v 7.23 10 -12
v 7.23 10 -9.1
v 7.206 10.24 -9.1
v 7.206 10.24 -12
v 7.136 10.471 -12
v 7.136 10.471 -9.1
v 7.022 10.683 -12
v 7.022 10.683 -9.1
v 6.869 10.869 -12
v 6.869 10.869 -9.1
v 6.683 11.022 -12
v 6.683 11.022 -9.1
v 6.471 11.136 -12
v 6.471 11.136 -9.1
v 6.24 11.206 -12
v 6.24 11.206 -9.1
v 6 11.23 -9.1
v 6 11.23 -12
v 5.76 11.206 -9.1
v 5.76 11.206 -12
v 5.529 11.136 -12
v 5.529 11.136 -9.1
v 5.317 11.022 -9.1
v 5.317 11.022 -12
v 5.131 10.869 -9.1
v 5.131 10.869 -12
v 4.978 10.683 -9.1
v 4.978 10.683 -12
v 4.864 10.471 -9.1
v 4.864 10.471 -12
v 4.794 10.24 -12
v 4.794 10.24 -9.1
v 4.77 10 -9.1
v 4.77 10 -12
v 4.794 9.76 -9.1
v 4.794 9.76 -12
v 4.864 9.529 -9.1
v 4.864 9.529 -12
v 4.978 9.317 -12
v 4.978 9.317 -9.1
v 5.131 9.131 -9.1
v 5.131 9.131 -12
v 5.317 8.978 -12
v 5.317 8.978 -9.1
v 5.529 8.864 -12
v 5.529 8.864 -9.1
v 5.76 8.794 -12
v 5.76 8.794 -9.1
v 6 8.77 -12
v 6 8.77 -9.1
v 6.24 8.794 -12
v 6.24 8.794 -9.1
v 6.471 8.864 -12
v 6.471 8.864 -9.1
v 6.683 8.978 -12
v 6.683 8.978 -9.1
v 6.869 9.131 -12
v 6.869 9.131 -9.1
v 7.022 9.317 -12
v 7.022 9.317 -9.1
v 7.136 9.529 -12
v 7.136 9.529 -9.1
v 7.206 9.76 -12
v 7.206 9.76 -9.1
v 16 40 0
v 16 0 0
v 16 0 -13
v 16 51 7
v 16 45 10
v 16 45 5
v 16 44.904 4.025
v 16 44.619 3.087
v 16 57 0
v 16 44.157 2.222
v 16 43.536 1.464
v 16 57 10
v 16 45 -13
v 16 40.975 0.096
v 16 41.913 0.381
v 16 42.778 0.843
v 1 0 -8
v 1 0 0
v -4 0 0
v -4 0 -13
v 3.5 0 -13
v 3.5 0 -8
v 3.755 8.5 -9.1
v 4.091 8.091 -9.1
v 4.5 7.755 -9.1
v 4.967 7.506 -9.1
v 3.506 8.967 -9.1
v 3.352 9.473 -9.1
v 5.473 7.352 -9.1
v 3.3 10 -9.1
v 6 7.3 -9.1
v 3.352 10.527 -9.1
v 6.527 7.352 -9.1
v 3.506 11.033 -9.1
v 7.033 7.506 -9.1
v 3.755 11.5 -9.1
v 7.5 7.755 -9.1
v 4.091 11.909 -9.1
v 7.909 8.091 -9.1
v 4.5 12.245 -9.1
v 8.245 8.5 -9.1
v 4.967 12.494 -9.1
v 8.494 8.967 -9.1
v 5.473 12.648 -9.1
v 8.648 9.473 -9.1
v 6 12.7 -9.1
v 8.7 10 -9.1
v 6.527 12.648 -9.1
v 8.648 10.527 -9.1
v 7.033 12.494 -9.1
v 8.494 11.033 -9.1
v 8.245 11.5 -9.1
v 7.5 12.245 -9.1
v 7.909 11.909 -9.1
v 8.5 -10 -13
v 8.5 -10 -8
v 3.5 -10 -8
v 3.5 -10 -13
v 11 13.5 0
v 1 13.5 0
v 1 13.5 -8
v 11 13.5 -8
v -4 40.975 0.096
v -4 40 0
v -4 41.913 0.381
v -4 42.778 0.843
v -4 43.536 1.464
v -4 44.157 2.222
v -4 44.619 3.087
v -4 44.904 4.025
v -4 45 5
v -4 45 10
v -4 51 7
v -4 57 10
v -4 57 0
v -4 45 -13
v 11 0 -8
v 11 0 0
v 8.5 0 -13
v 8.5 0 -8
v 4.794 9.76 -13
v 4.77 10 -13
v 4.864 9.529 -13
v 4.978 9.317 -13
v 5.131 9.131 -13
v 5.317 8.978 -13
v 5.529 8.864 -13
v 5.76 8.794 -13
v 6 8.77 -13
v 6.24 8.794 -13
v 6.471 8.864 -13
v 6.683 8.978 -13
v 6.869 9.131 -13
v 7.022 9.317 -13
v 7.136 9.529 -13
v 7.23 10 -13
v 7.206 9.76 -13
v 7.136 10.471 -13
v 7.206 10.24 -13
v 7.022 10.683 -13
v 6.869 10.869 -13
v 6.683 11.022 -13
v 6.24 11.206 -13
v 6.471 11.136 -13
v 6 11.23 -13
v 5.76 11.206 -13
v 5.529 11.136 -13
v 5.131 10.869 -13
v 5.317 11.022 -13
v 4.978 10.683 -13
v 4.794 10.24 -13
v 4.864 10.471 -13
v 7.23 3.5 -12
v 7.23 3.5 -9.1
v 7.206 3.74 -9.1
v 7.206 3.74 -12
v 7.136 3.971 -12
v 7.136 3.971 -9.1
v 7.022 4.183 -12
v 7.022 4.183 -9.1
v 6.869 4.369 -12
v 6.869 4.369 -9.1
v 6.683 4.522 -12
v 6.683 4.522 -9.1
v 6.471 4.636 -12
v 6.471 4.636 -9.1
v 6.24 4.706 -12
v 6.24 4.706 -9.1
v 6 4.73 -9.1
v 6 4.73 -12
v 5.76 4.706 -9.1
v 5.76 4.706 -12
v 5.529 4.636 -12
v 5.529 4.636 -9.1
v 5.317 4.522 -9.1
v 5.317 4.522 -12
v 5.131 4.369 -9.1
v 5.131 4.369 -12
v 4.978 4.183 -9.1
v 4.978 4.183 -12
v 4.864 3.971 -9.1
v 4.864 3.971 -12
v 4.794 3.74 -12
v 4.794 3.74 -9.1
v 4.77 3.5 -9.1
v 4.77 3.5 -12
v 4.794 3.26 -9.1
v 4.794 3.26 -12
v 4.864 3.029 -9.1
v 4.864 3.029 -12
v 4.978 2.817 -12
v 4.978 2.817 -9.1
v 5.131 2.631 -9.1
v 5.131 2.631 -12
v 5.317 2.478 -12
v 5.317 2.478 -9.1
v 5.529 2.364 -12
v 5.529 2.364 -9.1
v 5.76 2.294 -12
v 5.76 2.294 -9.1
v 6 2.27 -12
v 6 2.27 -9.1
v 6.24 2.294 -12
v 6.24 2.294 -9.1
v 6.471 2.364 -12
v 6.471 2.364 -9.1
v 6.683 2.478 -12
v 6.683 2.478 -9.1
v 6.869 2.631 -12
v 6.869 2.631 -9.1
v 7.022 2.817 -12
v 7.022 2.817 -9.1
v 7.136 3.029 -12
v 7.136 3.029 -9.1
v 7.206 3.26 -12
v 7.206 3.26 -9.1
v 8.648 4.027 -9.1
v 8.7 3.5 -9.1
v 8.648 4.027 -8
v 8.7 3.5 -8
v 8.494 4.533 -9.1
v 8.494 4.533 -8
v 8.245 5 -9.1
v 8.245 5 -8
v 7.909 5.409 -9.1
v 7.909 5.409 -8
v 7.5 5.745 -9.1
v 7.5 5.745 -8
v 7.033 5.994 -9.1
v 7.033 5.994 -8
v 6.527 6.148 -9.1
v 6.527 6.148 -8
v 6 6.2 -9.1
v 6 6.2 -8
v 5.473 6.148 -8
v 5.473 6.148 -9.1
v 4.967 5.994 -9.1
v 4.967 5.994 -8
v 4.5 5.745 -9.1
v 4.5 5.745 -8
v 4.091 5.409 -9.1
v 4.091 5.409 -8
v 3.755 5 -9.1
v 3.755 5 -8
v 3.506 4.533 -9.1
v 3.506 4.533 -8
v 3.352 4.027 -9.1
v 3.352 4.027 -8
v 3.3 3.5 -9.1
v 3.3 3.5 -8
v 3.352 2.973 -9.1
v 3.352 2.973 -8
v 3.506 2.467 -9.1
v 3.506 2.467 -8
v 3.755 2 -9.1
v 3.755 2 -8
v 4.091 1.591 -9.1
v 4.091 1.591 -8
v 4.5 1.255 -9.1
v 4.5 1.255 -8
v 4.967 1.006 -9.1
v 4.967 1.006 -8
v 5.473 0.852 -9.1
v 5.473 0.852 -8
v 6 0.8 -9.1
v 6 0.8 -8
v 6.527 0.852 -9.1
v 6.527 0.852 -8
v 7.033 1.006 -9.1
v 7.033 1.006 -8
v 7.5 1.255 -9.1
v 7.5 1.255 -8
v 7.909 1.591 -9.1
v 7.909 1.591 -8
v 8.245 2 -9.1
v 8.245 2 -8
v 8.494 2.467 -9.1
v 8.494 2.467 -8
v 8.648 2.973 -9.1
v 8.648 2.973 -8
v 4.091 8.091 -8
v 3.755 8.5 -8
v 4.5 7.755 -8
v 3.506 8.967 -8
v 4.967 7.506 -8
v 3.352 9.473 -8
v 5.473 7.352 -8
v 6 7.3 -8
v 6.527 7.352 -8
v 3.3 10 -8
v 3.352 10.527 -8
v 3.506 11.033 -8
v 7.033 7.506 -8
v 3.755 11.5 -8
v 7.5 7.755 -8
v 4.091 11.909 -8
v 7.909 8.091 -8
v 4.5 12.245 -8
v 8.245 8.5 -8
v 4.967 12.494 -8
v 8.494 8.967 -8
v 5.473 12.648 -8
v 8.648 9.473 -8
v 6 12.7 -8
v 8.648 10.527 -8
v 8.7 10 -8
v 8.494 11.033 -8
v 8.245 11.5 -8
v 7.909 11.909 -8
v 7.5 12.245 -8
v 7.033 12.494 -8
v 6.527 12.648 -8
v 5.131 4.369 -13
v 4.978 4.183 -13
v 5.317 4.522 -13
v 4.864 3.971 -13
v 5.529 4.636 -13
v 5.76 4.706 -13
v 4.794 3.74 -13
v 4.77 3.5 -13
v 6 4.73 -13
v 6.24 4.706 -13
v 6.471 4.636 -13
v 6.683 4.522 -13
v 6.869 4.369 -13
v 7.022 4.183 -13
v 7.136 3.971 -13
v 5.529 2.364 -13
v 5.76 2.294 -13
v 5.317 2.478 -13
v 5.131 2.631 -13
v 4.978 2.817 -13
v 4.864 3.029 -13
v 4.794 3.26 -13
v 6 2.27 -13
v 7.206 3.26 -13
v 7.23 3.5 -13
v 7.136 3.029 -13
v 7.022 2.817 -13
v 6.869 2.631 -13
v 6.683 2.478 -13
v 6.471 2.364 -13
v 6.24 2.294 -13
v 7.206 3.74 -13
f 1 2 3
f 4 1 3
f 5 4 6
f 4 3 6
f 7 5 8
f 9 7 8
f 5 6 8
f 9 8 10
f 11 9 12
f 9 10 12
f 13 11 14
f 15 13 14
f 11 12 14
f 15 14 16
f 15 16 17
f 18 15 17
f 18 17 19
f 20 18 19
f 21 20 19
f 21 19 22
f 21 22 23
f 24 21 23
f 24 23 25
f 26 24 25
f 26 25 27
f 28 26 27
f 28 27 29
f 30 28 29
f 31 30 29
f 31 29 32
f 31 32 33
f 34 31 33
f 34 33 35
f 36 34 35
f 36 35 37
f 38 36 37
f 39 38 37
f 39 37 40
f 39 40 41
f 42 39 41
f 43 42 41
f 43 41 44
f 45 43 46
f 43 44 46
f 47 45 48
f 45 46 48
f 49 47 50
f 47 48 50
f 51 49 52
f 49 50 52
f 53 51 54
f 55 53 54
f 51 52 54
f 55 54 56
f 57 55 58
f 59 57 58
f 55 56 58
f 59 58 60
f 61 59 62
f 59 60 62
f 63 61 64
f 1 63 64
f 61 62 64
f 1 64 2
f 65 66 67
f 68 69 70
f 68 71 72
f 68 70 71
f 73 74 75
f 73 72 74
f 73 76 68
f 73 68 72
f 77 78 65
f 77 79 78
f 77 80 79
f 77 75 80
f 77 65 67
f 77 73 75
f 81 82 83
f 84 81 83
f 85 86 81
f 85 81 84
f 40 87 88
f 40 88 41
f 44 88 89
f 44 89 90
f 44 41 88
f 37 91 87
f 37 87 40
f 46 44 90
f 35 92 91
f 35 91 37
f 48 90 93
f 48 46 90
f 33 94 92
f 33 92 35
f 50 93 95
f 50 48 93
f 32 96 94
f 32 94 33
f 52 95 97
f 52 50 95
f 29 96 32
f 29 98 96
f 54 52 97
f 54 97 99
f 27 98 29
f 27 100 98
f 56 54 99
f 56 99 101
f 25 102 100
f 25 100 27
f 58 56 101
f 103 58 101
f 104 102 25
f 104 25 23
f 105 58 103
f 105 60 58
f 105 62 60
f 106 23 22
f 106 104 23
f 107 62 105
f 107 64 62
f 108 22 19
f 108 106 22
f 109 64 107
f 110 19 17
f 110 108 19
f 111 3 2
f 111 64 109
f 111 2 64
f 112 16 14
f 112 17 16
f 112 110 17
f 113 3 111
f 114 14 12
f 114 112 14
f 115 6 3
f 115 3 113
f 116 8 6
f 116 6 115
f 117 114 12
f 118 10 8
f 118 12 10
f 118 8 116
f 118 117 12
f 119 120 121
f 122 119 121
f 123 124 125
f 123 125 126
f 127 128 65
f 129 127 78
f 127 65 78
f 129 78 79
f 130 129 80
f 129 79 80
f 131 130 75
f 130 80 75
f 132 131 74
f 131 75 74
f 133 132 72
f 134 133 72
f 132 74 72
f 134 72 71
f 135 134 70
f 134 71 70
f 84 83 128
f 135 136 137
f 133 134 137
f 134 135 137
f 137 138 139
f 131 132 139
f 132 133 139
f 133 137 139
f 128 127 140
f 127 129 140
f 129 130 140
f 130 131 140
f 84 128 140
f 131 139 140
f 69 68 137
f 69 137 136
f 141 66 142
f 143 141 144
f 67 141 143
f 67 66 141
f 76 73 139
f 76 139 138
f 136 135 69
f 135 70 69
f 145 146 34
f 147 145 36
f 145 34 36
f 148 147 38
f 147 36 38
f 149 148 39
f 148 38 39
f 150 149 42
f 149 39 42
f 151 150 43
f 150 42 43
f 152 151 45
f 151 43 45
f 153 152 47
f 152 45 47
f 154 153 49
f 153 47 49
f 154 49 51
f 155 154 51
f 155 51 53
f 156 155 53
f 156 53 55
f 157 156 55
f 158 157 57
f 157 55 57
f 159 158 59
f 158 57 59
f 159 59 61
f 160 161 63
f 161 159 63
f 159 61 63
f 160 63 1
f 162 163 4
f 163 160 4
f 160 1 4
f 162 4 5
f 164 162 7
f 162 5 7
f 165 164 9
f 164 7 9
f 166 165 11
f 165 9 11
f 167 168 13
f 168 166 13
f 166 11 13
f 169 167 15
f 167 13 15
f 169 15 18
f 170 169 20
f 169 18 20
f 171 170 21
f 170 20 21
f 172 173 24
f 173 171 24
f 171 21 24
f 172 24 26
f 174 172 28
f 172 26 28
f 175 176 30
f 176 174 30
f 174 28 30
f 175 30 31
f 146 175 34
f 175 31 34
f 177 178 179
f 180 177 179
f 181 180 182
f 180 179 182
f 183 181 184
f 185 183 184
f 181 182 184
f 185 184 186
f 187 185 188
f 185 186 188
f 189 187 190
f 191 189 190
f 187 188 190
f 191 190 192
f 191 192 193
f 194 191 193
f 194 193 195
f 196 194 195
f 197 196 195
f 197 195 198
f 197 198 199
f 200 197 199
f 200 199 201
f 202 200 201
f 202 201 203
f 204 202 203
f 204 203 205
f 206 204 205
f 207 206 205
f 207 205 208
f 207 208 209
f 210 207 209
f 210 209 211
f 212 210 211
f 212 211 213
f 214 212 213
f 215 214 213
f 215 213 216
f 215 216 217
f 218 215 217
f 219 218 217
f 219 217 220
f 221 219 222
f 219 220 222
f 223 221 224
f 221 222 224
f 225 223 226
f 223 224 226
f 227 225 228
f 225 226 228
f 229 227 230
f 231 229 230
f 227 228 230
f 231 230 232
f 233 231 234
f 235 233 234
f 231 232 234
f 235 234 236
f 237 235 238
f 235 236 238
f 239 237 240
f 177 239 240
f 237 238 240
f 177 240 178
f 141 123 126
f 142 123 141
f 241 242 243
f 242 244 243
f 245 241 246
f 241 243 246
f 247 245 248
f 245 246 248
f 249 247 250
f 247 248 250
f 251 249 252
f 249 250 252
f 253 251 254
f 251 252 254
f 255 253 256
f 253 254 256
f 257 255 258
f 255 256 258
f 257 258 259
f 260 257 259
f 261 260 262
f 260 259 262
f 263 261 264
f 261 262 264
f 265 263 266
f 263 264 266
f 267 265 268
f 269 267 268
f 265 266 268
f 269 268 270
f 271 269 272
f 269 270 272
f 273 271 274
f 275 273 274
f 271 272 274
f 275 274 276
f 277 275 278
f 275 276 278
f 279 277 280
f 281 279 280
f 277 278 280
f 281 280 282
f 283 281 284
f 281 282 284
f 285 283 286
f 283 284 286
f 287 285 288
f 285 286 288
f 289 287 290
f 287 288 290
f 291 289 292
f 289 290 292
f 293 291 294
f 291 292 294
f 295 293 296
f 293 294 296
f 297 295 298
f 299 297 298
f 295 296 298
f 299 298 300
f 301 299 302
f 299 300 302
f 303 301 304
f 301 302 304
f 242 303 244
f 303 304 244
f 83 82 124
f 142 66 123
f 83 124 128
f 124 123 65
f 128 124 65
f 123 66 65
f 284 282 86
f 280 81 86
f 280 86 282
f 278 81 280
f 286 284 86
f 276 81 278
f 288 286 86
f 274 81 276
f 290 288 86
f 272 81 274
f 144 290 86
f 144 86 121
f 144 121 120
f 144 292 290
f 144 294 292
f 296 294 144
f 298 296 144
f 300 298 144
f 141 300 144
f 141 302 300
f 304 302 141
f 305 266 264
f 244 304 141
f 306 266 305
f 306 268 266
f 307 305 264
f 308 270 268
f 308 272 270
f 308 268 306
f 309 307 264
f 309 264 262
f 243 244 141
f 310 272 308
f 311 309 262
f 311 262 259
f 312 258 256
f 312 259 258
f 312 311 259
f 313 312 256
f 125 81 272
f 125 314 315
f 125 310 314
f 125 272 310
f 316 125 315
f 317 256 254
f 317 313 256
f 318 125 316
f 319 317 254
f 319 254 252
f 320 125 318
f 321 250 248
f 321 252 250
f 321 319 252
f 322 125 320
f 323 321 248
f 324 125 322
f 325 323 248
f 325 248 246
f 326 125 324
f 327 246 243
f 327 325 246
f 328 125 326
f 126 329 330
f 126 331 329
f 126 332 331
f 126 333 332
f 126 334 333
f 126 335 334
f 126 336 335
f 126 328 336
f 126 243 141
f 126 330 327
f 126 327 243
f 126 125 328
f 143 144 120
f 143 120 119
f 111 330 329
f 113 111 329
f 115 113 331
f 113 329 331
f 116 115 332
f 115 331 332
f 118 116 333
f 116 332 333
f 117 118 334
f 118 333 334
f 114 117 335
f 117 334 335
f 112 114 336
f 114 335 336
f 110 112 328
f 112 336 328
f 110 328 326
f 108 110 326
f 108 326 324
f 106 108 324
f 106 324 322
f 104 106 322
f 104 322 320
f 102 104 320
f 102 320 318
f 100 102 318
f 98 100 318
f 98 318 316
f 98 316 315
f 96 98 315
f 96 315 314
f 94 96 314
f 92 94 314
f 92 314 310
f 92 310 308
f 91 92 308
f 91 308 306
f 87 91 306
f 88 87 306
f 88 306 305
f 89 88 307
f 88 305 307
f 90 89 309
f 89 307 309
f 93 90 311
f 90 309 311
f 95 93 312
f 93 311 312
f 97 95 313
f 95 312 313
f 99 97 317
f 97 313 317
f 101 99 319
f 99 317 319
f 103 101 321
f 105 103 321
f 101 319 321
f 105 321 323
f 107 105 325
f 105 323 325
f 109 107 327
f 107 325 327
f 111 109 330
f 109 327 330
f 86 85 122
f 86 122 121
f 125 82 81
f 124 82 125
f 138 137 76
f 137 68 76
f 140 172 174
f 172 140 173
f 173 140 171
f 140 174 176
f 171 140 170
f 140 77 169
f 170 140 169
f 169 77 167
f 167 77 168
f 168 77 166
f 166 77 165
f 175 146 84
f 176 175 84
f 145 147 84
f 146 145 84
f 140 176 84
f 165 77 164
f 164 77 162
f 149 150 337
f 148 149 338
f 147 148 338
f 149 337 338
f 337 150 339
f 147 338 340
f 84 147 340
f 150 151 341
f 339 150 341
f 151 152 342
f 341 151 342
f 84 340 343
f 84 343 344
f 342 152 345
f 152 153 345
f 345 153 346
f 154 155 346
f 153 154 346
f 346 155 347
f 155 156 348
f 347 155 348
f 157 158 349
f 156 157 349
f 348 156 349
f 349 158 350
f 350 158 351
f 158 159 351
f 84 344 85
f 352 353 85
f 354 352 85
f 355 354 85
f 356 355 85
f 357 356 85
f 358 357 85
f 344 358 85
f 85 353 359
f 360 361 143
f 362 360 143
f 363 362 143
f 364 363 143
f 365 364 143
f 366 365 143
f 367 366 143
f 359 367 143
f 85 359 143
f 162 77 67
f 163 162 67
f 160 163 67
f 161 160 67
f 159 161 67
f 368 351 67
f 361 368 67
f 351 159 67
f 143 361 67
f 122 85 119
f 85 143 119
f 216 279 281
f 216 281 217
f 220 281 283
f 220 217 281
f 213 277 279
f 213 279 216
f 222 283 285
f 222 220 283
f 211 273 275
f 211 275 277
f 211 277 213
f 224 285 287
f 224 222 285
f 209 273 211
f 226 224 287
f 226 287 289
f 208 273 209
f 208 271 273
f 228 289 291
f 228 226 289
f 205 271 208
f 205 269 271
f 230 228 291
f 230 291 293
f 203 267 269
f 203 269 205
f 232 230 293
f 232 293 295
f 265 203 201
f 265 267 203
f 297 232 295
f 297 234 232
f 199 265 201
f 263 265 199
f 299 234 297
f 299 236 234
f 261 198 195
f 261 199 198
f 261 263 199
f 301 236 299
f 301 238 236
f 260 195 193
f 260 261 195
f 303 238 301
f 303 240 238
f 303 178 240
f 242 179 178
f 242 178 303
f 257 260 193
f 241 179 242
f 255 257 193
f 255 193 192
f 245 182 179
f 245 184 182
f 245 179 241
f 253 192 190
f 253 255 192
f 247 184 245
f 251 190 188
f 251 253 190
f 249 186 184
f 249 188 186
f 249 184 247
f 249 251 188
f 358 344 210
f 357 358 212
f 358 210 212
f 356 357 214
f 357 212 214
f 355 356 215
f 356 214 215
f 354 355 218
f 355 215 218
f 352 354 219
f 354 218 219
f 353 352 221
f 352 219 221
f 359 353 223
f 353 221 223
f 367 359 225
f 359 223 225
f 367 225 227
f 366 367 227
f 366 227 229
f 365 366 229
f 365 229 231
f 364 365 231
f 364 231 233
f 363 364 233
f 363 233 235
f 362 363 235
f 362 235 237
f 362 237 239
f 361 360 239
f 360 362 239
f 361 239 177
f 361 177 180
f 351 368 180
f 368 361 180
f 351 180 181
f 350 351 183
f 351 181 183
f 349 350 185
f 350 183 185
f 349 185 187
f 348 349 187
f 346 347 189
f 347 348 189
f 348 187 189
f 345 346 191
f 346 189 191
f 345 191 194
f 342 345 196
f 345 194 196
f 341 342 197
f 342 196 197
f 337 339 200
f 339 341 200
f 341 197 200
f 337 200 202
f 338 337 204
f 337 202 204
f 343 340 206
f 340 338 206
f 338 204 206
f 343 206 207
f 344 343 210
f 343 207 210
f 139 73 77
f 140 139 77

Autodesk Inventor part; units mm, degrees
ref_plane "YZ Plane" through (0, 0, 0) normal (1, 0, 0) x (0, 1, 0)
ref_plane "XZ Plane" through (0, 0, 0) normal (0, 1, 0) x (-1, 0, 0)
sketch "Sketch2" plane through (0, 0, 0) normal (1, 0, 0) x (0, 1, 0)
  line L0 (0, 0) -> (15, 0)
  line L1 (15, 0) -> (15, -10)
  line L2 (15, -10) -> (0, -10)
  line L3 (0, -10) -> (0, 0)
  dimension "d4" = 15
  dimension "d5" = 10
extrude "Extrusion2" add sketch "Sketch2" along normal blind 12
sketch "Sketch3" plane through (0, 0, 0) normal (0, 0, 1) x (1, 0, 0)
  line L0 (0, 0) -> (1, 0)
  line L1 (0, 0) -> (12, 0) projected
  line L2 (1, 0) -> (1, 13.5)
  line L3 (1, 13.5) -> (11, 13.5)
  line L4 (11, 13.5) -> (11, 0)
  line L5 (11, 0) -> (1, 0)
  dimension "d8" = 1
  dimension "d9" = 13.5
  dimension "d10" = 10
extrude "Extrusion3" cut sketch "Sketch3" against normal blind 8
sketch "Sketch4" plane through (0, 0, -10) normal (0, 0, -1) x (-1, 0, 0)
  line L0 (0, 15) -> (-12, 15) projected
  line L1 (0, 0) -> (-12, 0) projected
  line L2 (-12, 15) -> (0, 15)
  line L3 (0, 15) -> (0, 0)
  line L4 (0, 0) -> (-12, 0)
  line L5 (-12, 0) -> (-12, 15)
extrude "Extrusion4" add sketch "Sketch4" along normal blind 2
sketch "Sketch5" plane through (0, 0, -8) normal (0, 0, 1) x (1, 0, 0)
  line L0 (1, 13.5) -> (11, 13.5) projected
  line L1 (6, 13.5) -> (6, 10)
  line L2 (6, 10) -> (6, 3.5)
  circle A0 centre (6, 10) radius 1.2295
  circle A1 centre (6, 3.5) radius 1.2295
  point P0 (0, 0)
  dimension "d15" = 3.5
  dimension "d16" = 6.5
  dimension "d17" = 2.459
  dimension "d18" = 2.459
extrude "Extrusion5" cut sketch "Sketch5" against normal blind 4
sketch "Sketch6" plane through (0, 0, -8) normal (0, 0, 1) x (1, 0, 0)
  circle A0 centre (6, 10) radius 1.2295 projected
  circle A1 centre (6, 10) radius 2.7
  circle A2 centre (6, 3.5) radius 1.2295 projected
  circle A3 centre (6, 3.5) radius 2.7
  point P0 (0, 0)
  dimension "d21" = 5.4
  dimension "d22" = 5.4
extrude "Extrusion6" cut sketch "Sketch6" against normal blind 1.1
sketch "Sketch15" plane through (12, 0, 0) normal (1, 0, 0) x (0, 0, -1)
  line L0 (0, 15) -> (12, 15) projected
  line L1 (12, 15) -> (12, 0) projected
  line L2 (0, 15) -> (12, 15)
  line L3 (12, 15) -> (12, 0)
  line L4 (12, 0) -> (0, 0)
  line L5 (0, 0) -> (0, 15)
extrude "Extrusion14" add sketch "Sketch15" along normal blind 4
ref_plane "Work Plane1" through (6, 0, 0) normal (1, 0, 0) x (0, 0, -1)
mirror "Mirror1" about plane through (6, 0, 0) normal (1, 0, 0) of "Extrusion14"
sketch "Sketch16" plane through (1, 0, -8) normal (0, -1, 0) x (1, 0, 0)
  line L0 (10, 0) -> (0, 0) projected
  line L1 (5, 0) -> (7.5, 0)
  line L2 (7.5, 0) -> (7.5, -4)
  line L3 (-5, -4) -> (15, -4) projected
  line L4 (7.5, -4) -> (2.5, -4)
  line L5 (2.5, -4) -> (2.5, 0)
  line L6 (2.5, 0) -> (5, 0)
  point P0 (-1, 8)
  dimension "d61" = 2.5
  dimension "d62" = 4
  dimension "d63" = 5
  dimension "d64" = 4
extrude "Extrusion15" add sketch "Sketch16" along normal blind 10
sketch "Sketch18" plane through (0, 0, -12) normal (0, 0, -1) x (-1, 0, 0)
  line L0 (-16, 15) -> (4, 15) projected
  line L1 (4, 0) -> (-3.5, 0) projected
  line L2 (-16, 15) -> (4, 15)
  line L3 (4, 15) -> (4, 0)
  line L4 (4, 0) -> (-16, 0)
  line L5 (-16, 0) -> (-16, 15)
  line L6 (-8.5, -10) -> (-3.5, -10) projected
  line L7 (-3.5, 0) -> (-8.5, 0)
  line L8 (-8.5, 0) -> (-8.5, -10)
  line L9 (-8.5, -10) -> (-3.5, -10)
  line L10 (-3.5, -10) -> (-3.5, 0)
  circle A0 centre (-6, 3.5) radius 1.2295 projected
  circle A1 centre (-6, 3.5) radius 1.2295
  circle A2 centre (-6, 10) radius 1.2295 projected
  circle A3 centre (-6, 10) radius 1.2295
  point P0 (0, 0)
extrude "Extrusion16" add sketch "Sketch18" along normal blind 1
sketch "Sketch19" plane through (16, 0, 0) normal (1, 0, 0) x (0, 0, -1)
  line L0 (0, 15) -> (13, 15) projected
  line L1 (0, 15) -> (0, 40)
  line L2 (13, 45) -> (13, 15)
  line L3 (0, 57) -> (-10, 57)
  line L4 (0, 57) -> (13, 45)
  arc A0 (0, 40) -> (-5, 45) centre (-5, 40) ccw
  line L5 (-5, 45) -> (-10, 45)
  line L6 (-7, 51) -> (-10, 57)
  line L7 (-7, 51) -> (-10, 45)
  point P0 (0, 0)
  point P1 (0, 45)
  dimension "d69" = 30
  dimension "d75" = 5
  dimension "d76" = 5
extrude "Extrusion17" add sketch "Sketch19" against normal blind 20
properties part number "3point finger"
